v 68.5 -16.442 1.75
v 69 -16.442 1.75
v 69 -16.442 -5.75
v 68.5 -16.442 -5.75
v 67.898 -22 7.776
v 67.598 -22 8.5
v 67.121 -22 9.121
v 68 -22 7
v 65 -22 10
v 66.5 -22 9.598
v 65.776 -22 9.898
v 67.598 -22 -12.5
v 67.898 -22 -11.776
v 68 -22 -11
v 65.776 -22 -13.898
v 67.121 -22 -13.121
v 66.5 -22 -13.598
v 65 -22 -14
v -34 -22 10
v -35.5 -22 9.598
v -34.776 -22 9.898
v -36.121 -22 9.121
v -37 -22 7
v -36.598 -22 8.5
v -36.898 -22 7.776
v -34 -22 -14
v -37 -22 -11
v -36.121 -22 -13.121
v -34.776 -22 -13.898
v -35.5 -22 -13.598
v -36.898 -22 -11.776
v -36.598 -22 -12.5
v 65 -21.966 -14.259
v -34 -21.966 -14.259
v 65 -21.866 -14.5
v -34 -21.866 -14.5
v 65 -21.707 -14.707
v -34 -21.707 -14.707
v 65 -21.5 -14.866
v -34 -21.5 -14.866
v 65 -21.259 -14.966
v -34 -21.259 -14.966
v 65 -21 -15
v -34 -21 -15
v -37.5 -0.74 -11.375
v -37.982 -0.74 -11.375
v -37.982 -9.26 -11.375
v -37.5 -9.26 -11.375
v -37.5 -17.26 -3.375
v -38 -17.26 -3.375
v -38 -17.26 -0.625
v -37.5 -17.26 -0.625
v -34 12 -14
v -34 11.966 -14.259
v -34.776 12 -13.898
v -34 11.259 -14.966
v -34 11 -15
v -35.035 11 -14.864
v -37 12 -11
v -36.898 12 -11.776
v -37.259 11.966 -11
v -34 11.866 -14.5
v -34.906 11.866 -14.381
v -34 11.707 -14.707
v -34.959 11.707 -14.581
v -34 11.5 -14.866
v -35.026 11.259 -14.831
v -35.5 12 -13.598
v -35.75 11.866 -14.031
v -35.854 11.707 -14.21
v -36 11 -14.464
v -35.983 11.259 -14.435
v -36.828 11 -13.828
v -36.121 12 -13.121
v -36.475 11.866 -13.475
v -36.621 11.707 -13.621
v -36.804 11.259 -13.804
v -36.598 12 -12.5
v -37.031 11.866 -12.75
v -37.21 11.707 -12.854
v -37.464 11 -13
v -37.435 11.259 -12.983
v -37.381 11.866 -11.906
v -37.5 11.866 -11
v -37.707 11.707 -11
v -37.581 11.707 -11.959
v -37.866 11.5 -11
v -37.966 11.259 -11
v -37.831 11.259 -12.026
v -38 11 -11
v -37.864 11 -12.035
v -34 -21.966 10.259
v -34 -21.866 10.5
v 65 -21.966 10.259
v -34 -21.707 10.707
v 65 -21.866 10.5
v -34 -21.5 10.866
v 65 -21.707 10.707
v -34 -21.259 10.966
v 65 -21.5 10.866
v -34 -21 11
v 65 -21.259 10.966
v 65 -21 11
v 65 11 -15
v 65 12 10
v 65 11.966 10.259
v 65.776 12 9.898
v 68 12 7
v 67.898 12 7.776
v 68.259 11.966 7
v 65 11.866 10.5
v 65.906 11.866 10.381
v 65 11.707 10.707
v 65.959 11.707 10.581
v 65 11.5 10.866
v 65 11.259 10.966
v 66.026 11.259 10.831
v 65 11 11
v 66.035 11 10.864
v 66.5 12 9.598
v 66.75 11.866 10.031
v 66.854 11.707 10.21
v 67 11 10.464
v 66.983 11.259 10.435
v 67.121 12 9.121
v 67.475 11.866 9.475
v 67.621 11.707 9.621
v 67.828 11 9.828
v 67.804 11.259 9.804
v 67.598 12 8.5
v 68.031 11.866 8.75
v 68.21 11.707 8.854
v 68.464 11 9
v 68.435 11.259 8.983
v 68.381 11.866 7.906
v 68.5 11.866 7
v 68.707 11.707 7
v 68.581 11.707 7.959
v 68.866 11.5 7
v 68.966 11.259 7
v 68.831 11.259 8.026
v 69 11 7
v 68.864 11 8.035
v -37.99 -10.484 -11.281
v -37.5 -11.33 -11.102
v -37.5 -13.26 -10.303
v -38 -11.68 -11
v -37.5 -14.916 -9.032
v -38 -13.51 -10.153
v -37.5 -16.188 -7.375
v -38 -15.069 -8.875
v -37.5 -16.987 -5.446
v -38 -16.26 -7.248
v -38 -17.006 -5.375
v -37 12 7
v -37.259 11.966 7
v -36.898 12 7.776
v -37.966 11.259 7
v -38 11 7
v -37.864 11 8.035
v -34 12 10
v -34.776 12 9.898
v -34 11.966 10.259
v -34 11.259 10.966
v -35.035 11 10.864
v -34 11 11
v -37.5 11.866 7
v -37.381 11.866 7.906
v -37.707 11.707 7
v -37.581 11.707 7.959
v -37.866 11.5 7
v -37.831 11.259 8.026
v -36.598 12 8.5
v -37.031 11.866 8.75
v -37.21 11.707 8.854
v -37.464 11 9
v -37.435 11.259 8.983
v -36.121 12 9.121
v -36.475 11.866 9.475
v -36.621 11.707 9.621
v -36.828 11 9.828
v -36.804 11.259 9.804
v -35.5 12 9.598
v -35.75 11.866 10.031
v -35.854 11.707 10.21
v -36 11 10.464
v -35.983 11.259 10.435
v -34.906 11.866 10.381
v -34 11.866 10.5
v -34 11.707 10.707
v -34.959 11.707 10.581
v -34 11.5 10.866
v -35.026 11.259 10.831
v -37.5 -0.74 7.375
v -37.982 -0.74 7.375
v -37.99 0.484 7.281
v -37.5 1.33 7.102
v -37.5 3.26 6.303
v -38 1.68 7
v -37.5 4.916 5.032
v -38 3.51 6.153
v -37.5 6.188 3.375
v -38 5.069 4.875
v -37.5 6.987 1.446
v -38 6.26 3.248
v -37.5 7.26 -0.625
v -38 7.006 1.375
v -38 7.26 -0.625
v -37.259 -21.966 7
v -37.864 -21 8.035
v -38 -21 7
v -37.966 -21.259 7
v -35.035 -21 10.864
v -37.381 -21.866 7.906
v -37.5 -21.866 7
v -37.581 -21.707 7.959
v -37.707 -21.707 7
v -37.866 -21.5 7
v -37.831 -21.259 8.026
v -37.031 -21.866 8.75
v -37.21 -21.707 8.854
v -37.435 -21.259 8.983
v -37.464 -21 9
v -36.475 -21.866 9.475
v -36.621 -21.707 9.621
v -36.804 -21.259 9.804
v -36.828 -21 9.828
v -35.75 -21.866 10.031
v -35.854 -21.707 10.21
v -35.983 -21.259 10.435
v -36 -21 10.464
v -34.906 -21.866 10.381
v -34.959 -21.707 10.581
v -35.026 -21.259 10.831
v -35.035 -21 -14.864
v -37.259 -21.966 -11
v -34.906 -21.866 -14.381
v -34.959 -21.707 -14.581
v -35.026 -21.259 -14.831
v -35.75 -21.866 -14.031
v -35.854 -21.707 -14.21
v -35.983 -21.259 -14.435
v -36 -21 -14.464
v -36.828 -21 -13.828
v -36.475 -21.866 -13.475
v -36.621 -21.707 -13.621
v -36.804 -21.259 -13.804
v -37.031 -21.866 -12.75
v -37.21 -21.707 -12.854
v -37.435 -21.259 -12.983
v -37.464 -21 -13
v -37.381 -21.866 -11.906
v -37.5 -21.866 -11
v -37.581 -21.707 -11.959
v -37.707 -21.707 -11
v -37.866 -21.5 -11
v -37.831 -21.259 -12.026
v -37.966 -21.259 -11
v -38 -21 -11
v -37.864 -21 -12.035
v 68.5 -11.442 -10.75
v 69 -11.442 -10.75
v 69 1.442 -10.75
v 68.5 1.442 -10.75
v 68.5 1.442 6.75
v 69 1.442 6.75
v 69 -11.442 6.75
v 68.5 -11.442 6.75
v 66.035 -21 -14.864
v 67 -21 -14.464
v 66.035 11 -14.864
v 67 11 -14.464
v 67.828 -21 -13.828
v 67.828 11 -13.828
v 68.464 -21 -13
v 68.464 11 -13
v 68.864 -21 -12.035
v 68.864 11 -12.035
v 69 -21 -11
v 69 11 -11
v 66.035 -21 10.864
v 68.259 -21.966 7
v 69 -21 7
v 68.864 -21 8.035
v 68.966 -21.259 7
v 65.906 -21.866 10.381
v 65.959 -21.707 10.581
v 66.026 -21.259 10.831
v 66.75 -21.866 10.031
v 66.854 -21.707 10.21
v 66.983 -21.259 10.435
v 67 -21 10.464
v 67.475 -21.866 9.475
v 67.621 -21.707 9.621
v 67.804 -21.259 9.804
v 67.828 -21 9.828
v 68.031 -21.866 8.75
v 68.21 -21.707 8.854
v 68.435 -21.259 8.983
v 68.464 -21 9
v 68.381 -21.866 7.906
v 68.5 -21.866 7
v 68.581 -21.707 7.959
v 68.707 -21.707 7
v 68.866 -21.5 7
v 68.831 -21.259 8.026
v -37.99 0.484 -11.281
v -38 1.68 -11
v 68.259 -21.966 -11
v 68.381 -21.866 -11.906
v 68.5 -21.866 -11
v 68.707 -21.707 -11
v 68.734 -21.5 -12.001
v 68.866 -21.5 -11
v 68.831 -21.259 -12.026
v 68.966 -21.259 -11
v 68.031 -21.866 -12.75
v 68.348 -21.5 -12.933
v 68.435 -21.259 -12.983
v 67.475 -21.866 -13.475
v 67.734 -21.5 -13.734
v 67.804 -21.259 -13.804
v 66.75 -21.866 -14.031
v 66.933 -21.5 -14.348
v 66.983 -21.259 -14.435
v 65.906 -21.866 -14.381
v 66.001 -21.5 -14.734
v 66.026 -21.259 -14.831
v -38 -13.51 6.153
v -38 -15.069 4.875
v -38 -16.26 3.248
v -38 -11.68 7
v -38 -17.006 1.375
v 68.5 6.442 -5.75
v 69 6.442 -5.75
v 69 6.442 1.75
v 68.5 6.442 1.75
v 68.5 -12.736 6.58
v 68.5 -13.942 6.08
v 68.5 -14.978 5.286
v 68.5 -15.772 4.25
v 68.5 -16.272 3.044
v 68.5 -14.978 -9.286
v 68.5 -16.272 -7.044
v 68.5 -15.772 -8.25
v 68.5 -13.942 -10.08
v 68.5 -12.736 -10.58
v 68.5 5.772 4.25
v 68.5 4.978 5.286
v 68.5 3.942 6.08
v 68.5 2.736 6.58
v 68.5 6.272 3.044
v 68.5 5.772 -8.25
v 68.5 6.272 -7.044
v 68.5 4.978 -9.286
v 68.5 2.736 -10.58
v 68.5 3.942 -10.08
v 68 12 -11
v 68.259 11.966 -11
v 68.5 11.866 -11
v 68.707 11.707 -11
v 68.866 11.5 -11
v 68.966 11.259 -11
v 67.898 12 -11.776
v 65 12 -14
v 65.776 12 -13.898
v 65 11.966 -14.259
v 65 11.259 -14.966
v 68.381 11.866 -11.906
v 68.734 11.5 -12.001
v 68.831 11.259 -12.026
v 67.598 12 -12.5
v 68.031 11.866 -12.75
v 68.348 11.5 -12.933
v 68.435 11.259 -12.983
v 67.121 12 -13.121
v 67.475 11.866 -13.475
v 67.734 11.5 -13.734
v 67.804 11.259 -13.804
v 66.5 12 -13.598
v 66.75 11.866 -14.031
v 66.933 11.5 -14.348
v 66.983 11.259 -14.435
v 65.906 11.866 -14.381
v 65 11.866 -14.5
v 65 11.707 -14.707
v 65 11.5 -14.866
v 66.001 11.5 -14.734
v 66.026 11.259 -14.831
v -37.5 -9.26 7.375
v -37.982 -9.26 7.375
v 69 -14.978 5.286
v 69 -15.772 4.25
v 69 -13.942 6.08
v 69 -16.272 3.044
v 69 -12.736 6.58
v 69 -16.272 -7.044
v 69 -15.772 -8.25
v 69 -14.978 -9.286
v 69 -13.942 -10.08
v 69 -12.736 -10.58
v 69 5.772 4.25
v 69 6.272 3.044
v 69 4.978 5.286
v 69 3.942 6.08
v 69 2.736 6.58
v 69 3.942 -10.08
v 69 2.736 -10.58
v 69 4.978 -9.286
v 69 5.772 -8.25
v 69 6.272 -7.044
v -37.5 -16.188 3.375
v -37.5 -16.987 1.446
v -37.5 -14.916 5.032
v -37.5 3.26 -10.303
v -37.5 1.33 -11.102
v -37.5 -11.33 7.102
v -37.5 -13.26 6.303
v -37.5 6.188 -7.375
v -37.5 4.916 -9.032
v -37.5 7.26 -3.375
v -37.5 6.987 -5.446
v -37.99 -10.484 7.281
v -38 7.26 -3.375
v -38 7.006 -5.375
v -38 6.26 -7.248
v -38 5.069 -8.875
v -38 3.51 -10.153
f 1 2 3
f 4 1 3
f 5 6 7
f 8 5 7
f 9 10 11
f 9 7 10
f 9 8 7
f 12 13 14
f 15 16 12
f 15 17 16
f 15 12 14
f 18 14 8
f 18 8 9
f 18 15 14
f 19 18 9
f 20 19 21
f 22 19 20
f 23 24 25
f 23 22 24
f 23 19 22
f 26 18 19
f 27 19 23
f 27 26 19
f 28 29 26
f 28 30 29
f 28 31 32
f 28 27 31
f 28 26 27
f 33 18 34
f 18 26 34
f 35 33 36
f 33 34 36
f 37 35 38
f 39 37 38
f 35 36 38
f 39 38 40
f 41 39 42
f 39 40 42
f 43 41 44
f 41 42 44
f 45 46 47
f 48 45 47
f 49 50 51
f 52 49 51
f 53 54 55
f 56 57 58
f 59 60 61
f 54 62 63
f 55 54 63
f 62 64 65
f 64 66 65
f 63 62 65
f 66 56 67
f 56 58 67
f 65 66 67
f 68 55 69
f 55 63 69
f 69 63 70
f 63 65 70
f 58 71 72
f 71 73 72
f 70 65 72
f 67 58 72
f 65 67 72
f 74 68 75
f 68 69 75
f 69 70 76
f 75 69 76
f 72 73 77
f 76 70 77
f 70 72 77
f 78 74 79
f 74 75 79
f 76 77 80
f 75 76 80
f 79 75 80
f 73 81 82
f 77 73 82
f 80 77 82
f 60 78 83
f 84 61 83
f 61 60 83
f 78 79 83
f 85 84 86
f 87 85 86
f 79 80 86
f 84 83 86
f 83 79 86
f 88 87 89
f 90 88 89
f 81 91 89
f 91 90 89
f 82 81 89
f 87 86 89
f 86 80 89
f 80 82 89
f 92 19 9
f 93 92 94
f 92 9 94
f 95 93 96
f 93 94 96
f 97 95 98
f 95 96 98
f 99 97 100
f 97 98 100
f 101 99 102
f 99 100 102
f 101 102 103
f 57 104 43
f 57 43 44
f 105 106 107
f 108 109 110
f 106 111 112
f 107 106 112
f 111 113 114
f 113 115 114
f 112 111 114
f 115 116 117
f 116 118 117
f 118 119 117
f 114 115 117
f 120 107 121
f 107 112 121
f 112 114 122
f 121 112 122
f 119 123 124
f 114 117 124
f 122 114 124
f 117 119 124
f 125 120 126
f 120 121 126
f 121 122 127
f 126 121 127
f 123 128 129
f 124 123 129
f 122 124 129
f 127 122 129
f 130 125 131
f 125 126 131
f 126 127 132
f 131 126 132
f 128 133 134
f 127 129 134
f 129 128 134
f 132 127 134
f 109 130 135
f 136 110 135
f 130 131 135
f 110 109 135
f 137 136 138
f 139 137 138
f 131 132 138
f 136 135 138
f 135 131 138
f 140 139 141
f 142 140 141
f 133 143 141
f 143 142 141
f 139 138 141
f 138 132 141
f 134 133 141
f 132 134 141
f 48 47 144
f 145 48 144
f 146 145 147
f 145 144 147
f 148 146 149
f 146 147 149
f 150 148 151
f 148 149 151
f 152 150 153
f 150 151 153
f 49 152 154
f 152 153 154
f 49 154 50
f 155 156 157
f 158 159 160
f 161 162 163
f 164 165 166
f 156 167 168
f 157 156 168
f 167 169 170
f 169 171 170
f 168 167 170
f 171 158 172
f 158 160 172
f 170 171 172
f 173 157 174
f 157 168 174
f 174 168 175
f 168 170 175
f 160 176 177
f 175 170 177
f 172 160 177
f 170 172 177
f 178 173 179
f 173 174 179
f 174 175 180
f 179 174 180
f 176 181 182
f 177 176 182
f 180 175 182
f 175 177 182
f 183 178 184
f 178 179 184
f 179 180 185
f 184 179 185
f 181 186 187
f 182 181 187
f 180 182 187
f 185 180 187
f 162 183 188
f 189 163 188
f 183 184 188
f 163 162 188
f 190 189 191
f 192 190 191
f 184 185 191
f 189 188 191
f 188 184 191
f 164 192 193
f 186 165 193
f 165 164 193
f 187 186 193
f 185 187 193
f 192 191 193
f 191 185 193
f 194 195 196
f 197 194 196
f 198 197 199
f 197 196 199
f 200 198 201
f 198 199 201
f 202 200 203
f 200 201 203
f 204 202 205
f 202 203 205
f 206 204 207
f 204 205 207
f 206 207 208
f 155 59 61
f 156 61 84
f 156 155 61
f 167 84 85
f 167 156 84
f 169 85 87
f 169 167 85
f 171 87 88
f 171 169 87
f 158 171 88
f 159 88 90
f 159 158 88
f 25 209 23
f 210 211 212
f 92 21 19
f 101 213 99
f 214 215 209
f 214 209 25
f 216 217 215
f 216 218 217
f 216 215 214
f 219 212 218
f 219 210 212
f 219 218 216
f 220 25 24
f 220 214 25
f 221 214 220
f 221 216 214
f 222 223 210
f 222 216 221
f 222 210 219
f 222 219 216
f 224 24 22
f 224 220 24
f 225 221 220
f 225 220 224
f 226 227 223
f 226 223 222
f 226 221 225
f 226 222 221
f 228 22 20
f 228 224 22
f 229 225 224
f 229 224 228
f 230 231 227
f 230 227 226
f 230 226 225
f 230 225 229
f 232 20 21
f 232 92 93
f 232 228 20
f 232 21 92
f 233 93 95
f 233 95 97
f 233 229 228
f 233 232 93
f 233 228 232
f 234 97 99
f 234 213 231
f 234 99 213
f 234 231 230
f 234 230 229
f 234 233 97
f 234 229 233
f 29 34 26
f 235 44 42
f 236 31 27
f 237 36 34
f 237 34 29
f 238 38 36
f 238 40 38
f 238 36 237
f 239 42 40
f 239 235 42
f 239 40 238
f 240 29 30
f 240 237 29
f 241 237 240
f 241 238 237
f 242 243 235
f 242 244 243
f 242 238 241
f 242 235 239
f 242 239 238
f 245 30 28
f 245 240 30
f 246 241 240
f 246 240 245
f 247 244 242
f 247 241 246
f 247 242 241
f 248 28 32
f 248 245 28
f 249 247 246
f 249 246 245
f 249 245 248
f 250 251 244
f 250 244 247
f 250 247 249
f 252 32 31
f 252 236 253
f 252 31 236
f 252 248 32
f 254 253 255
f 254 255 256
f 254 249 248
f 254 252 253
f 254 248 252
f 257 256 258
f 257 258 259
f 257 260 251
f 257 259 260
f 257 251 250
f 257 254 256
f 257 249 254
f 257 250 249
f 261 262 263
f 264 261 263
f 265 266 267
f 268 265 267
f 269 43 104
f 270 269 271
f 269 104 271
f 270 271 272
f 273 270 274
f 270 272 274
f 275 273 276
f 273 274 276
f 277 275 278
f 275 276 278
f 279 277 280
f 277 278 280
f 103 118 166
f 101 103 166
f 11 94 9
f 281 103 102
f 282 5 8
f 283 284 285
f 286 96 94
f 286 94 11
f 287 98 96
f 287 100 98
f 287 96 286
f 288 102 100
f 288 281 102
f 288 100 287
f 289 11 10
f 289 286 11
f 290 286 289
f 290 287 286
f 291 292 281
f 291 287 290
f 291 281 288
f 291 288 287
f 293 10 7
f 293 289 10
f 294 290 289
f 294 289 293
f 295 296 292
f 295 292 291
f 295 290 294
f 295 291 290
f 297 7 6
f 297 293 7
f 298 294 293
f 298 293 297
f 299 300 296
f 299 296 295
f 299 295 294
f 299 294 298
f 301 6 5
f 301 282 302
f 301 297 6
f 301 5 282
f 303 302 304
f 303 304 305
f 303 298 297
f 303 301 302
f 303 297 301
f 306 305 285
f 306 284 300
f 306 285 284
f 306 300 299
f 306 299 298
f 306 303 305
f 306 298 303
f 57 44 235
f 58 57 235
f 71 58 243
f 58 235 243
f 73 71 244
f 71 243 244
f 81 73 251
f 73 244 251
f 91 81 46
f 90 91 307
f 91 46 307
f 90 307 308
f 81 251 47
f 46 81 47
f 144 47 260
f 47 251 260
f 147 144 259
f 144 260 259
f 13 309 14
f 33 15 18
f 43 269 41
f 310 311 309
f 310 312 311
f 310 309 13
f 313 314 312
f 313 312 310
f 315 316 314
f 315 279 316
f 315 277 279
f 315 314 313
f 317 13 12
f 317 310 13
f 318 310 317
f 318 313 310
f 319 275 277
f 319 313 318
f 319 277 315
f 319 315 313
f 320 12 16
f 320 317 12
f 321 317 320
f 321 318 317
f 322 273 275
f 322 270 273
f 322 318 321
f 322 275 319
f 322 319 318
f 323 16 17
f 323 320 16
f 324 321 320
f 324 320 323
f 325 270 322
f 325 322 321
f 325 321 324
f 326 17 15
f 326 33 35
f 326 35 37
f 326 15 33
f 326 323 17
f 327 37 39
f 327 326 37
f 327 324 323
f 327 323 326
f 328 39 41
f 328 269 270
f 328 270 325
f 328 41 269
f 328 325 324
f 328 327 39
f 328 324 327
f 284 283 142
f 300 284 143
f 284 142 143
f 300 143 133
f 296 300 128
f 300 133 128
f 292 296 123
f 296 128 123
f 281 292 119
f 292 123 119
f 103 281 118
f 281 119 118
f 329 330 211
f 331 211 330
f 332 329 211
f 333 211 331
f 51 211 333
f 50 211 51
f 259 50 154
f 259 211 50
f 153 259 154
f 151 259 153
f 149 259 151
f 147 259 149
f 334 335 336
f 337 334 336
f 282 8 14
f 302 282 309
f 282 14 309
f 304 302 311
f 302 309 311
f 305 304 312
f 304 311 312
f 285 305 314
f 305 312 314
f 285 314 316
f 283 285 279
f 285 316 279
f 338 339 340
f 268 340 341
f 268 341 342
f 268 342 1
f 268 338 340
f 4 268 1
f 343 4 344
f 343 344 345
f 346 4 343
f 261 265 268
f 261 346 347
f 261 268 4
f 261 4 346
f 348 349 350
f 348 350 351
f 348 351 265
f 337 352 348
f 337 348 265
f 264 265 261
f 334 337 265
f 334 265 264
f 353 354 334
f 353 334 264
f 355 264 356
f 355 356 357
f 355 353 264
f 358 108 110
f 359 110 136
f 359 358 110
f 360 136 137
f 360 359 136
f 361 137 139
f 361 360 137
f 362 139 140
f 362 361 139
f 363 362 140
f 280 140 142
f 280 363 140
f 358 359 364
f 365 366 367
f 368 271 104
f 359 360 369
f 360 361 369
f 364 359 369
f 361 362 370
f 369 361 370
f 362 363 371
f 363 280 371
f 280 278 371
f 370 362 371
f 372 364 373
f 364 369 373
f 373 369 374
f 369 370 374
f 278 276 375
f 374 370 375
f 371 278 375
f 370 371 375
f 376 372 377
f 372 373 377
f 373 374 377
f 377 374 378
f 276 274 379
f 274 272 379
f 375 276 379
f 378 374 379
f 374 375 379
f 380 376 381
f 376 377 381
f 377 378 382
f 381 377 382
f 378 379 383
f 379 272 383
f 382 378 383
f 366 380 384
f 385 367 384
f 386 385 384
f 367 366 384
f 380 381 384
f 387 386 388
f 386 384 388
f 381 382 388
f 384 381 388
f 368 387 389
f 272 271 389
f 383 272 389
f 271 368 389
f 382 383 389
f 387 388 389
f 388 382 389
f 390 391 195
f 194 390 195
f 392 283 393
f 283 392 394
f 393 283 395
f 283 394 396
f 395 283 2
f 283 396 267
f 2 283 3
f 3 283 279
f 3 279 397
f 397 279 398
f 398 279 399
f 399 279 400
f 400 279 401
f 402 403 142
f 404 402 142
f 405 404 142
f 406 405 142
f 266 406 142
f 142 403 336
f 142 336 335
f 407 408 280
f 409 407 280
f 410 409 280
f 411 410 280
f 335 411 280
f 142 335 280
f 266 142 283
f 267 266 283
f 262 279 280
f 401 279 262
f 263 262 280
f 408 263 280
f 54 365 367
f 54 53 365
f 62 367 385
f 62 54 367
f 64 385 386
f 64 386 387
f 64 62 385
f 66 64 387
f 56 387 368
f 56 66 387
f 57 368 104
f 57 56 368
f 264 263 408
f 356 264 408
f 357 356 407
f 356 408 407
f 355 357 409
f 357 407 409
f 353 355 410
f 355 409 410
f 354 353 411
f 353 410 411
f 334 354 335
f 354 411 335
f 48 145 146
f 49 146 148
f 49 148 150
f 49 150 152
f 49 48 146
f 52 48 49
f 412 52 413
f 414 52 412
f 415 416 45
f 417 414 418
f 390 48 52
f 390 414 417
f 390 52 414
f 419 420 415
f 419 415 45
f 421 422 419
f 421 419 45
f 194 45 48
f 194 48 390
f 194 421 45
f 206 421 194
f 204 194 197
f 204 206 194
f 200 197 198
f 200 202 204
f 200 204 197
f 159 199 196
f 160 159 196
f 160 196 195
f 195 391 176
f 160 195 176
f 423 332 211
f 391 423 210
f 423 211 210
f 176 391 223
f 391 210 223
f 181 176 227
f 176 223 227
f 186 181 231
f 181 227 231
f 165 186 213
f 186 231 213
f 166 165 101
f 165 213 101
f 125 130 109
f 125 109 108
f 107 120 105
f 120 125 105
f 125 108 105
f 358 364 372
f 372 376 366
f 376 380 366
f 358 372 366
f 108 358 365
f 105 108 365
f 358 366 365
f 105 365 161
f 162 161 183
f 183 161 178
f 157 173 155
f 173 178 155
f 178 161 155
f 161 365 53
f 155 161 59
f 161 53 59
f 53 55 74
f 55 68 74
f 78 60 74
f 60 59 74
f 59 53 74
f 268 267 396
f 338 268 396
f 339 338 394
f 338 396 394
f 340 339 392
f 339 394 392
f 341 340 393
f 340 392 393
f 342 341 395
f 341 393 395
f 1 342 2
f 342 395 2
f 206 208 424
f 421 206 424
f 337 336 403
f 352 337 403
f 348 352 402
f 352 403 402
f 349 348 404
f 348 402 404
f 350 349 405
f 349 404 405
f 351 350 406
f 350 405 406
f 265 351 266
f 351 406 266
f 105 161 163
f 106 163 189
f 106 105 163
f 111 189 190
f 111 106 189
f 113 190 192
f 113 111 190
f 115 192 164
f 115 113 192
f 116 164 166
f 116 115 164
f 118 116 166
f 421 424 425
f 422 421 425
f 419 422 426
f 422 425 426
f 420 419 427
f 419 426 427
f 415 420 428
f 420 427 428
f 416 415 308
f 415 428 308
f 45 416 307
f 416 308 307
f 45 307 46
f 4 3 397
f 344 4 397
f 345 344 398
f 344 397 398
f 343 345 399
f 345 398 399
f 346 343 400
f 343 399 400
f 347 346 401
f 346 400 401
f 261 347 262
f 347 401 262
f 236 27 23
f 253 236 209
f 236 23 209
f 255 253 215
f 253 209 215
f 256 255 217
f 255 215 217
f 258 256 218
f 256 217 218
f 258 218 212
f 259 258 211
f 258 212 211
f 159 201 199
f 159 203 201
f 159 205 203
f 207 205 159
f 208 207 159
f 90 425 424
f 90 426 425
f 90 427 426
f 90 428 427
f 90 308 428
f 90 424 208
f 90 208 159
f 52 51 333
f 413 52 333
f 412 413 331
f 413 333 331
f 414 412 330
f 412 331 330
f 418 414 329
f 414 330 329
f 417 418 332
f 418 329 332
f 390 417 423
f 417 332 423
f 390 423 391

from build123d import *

# Parameters (mm, degrees)
SKETCH1_W           = 107
SKETCH1_H           = 34
BOSS_EXTRUDE1_DEPTH = 26
CUT_EXTRUDE1_DEPTH  = 0.5
CUT_EXTRUDE2_DEPTH  = 0.5
FILLET1_R           = 4
FILLET2_R           = 1


with BuildPart() as part:
    # Sketch1 → Boss-Extrude1 (new body)
    with BuildSketch(Plane(origin=(0, 0, -15), x_dir=(-1, 0, 0), z_dir=(0, 0, -1))):
        with Locations((-15.5, -5)):
            Rectangle(SKETCH1_W, SKETCH1_H)
    extrude(amount=-BOSS_EXTRUDE1_DEPTH)

    # Sketch2 → Cut-Extrude1 (cut)
    with BuildSketch(Plane(origin=(69, 0, 0), x_dir=(0, 0, -1), z_dir=(1, 0, 0))):
        with BuildLine():
            Line((-6.75, 1.442307692), (-6.75, -11.442307692))
            ThreePointArc((-6.75, -11.442307692), (-5.285533906, -14.977841598), (-1.75, -16.442307692))
            Line((-1.75, -16.442307692), (5.75, -16.442307692))
            ThreePointArc((5.75, -16.442307692), (9.285533906, -14.977841598), (10.75, -11.442307692))
            Line((10.75, -11.442307692), (10.75, 1.442307692))
            ThreePointArc((10.75, 1.442307692), (9.285533906, 4.977841598), (5.75, 6.442307692))
            Line((5.75, 6.442307692), (-1.75, 6.442307692))
            ThreePointArc((-1.75, 6.442307692), (-5.285533906, 4.977841598), (-6.75, 1.442307692))
        make_face()
    extrude(amount=-CUT_EXTRUDE1_DEPTH, mode=Mode.SUBTRACT)

    # Sketch3 → Cut-Extrude2 (cut)
    with BuildSketch(Plane.ZY.offset(38)):
        with BuildLine():
            Line((-0.625, 7.259615385), (-3.375, 7.259615385))
            ThreePointArc((-3.375, 7.259615385), (-9.031854249, 4.916469634), (-11.375, -0.740384615))
            Line((-11.375, -0.740384615), (-11.375, -9.259615385))
            ThreePointArc((-11.375, -9.259615385), (-9.031854249, -14.916469634), (-3.375, -17.259615385))
            Line((-3.375, -17.259615385), (-0.625, -17.259615385))
            ThreePointArc((-0.625, -17.259615385), (5.031854249, -14.916469634), (7.375, -9.259615385))
            Line((7.375, -9.259615385), (7.375, -0.740384615))
            ThreePointArc((7.375, -0.740384615), (5.031854249, 4.916469634), (-0.625, 7.259615385))
        make_face()
    extrude(amount=-CUT_EXTRUDE2_DEPTH, mode=Mode.SUBTRACT)

    # Fillet1
    # the kernel refuses this fillet: 4 mm, written as the material it takes off along each edge
    with BuildSketch(Plane(origin=(-38, -32, -15), x_dir=(0, 0, 1), z_dir=(0, 1, 0)), Plane(origin=(69, 22, -15), x_dir=(0, 0, 1), z_dir=(0, -1, 0))) as fillet1_piece_1:
        with BuildLine():
            CenterArc((FILLET1_R, FILLET1_R), FILLET1_R, 180, 90)
            Line((0, FILLET1_R), (0, 0))
            Line((0, 0), (FILLET1_R, 0))
        make_face()
    extrude(amount=54, mode=Mode.SUBTRACT)
    with BuildSketch(Plane(origin=(-38, -32, 11), x_dir=(0, 0, -1), z_dir=(0, 1, 0)), Plane(origin=(69, 22, 11), x_dir=(0, 0, -1), z_dir=(0, -1, 0))) as fillet1_piece_2:
        with BuildLine():
            CenterArc((FILLET1_R, -FILLET1_R), FILLET1_R, 90, 90)
            Line((0, -FILLET1_R), (0, 0))
            Line((0, 0), (FILLET1_R, 0))
        make_face()
    extrude(amount=54, mode=Mode.SUBTRACT)

    # Fillet2
    fillet2_edges = [part.edges().sort_by_distance(p)[0] for p in [
        (15.5, -22, -15),
        (15.5, 12, -15),
        (-38, 12, -2),
        (15.5, 12, 11),
        (69, 12, -2),
        (67.828427125, 12, 9.828427125),
        (67.828427125, 12, -13.828427125),
        (-36.828427125, 12, 9.828427125),
        (-36.828427125, 12, -13.828427125),
        (-38, -22, -2),
        (69, -22, -2),
        (15.5, -22, 11),
        (67.828427125, -22, 9.828427125),
        (67.828427125, -22, -13.828427125),
        (-36.828427125, -22, 9.828427125),
        (-36.828427125, -22, -13.828427125),
    ]]
    fillet(fillet2_edges, radius=FILLET2_R)


solid = part.part
